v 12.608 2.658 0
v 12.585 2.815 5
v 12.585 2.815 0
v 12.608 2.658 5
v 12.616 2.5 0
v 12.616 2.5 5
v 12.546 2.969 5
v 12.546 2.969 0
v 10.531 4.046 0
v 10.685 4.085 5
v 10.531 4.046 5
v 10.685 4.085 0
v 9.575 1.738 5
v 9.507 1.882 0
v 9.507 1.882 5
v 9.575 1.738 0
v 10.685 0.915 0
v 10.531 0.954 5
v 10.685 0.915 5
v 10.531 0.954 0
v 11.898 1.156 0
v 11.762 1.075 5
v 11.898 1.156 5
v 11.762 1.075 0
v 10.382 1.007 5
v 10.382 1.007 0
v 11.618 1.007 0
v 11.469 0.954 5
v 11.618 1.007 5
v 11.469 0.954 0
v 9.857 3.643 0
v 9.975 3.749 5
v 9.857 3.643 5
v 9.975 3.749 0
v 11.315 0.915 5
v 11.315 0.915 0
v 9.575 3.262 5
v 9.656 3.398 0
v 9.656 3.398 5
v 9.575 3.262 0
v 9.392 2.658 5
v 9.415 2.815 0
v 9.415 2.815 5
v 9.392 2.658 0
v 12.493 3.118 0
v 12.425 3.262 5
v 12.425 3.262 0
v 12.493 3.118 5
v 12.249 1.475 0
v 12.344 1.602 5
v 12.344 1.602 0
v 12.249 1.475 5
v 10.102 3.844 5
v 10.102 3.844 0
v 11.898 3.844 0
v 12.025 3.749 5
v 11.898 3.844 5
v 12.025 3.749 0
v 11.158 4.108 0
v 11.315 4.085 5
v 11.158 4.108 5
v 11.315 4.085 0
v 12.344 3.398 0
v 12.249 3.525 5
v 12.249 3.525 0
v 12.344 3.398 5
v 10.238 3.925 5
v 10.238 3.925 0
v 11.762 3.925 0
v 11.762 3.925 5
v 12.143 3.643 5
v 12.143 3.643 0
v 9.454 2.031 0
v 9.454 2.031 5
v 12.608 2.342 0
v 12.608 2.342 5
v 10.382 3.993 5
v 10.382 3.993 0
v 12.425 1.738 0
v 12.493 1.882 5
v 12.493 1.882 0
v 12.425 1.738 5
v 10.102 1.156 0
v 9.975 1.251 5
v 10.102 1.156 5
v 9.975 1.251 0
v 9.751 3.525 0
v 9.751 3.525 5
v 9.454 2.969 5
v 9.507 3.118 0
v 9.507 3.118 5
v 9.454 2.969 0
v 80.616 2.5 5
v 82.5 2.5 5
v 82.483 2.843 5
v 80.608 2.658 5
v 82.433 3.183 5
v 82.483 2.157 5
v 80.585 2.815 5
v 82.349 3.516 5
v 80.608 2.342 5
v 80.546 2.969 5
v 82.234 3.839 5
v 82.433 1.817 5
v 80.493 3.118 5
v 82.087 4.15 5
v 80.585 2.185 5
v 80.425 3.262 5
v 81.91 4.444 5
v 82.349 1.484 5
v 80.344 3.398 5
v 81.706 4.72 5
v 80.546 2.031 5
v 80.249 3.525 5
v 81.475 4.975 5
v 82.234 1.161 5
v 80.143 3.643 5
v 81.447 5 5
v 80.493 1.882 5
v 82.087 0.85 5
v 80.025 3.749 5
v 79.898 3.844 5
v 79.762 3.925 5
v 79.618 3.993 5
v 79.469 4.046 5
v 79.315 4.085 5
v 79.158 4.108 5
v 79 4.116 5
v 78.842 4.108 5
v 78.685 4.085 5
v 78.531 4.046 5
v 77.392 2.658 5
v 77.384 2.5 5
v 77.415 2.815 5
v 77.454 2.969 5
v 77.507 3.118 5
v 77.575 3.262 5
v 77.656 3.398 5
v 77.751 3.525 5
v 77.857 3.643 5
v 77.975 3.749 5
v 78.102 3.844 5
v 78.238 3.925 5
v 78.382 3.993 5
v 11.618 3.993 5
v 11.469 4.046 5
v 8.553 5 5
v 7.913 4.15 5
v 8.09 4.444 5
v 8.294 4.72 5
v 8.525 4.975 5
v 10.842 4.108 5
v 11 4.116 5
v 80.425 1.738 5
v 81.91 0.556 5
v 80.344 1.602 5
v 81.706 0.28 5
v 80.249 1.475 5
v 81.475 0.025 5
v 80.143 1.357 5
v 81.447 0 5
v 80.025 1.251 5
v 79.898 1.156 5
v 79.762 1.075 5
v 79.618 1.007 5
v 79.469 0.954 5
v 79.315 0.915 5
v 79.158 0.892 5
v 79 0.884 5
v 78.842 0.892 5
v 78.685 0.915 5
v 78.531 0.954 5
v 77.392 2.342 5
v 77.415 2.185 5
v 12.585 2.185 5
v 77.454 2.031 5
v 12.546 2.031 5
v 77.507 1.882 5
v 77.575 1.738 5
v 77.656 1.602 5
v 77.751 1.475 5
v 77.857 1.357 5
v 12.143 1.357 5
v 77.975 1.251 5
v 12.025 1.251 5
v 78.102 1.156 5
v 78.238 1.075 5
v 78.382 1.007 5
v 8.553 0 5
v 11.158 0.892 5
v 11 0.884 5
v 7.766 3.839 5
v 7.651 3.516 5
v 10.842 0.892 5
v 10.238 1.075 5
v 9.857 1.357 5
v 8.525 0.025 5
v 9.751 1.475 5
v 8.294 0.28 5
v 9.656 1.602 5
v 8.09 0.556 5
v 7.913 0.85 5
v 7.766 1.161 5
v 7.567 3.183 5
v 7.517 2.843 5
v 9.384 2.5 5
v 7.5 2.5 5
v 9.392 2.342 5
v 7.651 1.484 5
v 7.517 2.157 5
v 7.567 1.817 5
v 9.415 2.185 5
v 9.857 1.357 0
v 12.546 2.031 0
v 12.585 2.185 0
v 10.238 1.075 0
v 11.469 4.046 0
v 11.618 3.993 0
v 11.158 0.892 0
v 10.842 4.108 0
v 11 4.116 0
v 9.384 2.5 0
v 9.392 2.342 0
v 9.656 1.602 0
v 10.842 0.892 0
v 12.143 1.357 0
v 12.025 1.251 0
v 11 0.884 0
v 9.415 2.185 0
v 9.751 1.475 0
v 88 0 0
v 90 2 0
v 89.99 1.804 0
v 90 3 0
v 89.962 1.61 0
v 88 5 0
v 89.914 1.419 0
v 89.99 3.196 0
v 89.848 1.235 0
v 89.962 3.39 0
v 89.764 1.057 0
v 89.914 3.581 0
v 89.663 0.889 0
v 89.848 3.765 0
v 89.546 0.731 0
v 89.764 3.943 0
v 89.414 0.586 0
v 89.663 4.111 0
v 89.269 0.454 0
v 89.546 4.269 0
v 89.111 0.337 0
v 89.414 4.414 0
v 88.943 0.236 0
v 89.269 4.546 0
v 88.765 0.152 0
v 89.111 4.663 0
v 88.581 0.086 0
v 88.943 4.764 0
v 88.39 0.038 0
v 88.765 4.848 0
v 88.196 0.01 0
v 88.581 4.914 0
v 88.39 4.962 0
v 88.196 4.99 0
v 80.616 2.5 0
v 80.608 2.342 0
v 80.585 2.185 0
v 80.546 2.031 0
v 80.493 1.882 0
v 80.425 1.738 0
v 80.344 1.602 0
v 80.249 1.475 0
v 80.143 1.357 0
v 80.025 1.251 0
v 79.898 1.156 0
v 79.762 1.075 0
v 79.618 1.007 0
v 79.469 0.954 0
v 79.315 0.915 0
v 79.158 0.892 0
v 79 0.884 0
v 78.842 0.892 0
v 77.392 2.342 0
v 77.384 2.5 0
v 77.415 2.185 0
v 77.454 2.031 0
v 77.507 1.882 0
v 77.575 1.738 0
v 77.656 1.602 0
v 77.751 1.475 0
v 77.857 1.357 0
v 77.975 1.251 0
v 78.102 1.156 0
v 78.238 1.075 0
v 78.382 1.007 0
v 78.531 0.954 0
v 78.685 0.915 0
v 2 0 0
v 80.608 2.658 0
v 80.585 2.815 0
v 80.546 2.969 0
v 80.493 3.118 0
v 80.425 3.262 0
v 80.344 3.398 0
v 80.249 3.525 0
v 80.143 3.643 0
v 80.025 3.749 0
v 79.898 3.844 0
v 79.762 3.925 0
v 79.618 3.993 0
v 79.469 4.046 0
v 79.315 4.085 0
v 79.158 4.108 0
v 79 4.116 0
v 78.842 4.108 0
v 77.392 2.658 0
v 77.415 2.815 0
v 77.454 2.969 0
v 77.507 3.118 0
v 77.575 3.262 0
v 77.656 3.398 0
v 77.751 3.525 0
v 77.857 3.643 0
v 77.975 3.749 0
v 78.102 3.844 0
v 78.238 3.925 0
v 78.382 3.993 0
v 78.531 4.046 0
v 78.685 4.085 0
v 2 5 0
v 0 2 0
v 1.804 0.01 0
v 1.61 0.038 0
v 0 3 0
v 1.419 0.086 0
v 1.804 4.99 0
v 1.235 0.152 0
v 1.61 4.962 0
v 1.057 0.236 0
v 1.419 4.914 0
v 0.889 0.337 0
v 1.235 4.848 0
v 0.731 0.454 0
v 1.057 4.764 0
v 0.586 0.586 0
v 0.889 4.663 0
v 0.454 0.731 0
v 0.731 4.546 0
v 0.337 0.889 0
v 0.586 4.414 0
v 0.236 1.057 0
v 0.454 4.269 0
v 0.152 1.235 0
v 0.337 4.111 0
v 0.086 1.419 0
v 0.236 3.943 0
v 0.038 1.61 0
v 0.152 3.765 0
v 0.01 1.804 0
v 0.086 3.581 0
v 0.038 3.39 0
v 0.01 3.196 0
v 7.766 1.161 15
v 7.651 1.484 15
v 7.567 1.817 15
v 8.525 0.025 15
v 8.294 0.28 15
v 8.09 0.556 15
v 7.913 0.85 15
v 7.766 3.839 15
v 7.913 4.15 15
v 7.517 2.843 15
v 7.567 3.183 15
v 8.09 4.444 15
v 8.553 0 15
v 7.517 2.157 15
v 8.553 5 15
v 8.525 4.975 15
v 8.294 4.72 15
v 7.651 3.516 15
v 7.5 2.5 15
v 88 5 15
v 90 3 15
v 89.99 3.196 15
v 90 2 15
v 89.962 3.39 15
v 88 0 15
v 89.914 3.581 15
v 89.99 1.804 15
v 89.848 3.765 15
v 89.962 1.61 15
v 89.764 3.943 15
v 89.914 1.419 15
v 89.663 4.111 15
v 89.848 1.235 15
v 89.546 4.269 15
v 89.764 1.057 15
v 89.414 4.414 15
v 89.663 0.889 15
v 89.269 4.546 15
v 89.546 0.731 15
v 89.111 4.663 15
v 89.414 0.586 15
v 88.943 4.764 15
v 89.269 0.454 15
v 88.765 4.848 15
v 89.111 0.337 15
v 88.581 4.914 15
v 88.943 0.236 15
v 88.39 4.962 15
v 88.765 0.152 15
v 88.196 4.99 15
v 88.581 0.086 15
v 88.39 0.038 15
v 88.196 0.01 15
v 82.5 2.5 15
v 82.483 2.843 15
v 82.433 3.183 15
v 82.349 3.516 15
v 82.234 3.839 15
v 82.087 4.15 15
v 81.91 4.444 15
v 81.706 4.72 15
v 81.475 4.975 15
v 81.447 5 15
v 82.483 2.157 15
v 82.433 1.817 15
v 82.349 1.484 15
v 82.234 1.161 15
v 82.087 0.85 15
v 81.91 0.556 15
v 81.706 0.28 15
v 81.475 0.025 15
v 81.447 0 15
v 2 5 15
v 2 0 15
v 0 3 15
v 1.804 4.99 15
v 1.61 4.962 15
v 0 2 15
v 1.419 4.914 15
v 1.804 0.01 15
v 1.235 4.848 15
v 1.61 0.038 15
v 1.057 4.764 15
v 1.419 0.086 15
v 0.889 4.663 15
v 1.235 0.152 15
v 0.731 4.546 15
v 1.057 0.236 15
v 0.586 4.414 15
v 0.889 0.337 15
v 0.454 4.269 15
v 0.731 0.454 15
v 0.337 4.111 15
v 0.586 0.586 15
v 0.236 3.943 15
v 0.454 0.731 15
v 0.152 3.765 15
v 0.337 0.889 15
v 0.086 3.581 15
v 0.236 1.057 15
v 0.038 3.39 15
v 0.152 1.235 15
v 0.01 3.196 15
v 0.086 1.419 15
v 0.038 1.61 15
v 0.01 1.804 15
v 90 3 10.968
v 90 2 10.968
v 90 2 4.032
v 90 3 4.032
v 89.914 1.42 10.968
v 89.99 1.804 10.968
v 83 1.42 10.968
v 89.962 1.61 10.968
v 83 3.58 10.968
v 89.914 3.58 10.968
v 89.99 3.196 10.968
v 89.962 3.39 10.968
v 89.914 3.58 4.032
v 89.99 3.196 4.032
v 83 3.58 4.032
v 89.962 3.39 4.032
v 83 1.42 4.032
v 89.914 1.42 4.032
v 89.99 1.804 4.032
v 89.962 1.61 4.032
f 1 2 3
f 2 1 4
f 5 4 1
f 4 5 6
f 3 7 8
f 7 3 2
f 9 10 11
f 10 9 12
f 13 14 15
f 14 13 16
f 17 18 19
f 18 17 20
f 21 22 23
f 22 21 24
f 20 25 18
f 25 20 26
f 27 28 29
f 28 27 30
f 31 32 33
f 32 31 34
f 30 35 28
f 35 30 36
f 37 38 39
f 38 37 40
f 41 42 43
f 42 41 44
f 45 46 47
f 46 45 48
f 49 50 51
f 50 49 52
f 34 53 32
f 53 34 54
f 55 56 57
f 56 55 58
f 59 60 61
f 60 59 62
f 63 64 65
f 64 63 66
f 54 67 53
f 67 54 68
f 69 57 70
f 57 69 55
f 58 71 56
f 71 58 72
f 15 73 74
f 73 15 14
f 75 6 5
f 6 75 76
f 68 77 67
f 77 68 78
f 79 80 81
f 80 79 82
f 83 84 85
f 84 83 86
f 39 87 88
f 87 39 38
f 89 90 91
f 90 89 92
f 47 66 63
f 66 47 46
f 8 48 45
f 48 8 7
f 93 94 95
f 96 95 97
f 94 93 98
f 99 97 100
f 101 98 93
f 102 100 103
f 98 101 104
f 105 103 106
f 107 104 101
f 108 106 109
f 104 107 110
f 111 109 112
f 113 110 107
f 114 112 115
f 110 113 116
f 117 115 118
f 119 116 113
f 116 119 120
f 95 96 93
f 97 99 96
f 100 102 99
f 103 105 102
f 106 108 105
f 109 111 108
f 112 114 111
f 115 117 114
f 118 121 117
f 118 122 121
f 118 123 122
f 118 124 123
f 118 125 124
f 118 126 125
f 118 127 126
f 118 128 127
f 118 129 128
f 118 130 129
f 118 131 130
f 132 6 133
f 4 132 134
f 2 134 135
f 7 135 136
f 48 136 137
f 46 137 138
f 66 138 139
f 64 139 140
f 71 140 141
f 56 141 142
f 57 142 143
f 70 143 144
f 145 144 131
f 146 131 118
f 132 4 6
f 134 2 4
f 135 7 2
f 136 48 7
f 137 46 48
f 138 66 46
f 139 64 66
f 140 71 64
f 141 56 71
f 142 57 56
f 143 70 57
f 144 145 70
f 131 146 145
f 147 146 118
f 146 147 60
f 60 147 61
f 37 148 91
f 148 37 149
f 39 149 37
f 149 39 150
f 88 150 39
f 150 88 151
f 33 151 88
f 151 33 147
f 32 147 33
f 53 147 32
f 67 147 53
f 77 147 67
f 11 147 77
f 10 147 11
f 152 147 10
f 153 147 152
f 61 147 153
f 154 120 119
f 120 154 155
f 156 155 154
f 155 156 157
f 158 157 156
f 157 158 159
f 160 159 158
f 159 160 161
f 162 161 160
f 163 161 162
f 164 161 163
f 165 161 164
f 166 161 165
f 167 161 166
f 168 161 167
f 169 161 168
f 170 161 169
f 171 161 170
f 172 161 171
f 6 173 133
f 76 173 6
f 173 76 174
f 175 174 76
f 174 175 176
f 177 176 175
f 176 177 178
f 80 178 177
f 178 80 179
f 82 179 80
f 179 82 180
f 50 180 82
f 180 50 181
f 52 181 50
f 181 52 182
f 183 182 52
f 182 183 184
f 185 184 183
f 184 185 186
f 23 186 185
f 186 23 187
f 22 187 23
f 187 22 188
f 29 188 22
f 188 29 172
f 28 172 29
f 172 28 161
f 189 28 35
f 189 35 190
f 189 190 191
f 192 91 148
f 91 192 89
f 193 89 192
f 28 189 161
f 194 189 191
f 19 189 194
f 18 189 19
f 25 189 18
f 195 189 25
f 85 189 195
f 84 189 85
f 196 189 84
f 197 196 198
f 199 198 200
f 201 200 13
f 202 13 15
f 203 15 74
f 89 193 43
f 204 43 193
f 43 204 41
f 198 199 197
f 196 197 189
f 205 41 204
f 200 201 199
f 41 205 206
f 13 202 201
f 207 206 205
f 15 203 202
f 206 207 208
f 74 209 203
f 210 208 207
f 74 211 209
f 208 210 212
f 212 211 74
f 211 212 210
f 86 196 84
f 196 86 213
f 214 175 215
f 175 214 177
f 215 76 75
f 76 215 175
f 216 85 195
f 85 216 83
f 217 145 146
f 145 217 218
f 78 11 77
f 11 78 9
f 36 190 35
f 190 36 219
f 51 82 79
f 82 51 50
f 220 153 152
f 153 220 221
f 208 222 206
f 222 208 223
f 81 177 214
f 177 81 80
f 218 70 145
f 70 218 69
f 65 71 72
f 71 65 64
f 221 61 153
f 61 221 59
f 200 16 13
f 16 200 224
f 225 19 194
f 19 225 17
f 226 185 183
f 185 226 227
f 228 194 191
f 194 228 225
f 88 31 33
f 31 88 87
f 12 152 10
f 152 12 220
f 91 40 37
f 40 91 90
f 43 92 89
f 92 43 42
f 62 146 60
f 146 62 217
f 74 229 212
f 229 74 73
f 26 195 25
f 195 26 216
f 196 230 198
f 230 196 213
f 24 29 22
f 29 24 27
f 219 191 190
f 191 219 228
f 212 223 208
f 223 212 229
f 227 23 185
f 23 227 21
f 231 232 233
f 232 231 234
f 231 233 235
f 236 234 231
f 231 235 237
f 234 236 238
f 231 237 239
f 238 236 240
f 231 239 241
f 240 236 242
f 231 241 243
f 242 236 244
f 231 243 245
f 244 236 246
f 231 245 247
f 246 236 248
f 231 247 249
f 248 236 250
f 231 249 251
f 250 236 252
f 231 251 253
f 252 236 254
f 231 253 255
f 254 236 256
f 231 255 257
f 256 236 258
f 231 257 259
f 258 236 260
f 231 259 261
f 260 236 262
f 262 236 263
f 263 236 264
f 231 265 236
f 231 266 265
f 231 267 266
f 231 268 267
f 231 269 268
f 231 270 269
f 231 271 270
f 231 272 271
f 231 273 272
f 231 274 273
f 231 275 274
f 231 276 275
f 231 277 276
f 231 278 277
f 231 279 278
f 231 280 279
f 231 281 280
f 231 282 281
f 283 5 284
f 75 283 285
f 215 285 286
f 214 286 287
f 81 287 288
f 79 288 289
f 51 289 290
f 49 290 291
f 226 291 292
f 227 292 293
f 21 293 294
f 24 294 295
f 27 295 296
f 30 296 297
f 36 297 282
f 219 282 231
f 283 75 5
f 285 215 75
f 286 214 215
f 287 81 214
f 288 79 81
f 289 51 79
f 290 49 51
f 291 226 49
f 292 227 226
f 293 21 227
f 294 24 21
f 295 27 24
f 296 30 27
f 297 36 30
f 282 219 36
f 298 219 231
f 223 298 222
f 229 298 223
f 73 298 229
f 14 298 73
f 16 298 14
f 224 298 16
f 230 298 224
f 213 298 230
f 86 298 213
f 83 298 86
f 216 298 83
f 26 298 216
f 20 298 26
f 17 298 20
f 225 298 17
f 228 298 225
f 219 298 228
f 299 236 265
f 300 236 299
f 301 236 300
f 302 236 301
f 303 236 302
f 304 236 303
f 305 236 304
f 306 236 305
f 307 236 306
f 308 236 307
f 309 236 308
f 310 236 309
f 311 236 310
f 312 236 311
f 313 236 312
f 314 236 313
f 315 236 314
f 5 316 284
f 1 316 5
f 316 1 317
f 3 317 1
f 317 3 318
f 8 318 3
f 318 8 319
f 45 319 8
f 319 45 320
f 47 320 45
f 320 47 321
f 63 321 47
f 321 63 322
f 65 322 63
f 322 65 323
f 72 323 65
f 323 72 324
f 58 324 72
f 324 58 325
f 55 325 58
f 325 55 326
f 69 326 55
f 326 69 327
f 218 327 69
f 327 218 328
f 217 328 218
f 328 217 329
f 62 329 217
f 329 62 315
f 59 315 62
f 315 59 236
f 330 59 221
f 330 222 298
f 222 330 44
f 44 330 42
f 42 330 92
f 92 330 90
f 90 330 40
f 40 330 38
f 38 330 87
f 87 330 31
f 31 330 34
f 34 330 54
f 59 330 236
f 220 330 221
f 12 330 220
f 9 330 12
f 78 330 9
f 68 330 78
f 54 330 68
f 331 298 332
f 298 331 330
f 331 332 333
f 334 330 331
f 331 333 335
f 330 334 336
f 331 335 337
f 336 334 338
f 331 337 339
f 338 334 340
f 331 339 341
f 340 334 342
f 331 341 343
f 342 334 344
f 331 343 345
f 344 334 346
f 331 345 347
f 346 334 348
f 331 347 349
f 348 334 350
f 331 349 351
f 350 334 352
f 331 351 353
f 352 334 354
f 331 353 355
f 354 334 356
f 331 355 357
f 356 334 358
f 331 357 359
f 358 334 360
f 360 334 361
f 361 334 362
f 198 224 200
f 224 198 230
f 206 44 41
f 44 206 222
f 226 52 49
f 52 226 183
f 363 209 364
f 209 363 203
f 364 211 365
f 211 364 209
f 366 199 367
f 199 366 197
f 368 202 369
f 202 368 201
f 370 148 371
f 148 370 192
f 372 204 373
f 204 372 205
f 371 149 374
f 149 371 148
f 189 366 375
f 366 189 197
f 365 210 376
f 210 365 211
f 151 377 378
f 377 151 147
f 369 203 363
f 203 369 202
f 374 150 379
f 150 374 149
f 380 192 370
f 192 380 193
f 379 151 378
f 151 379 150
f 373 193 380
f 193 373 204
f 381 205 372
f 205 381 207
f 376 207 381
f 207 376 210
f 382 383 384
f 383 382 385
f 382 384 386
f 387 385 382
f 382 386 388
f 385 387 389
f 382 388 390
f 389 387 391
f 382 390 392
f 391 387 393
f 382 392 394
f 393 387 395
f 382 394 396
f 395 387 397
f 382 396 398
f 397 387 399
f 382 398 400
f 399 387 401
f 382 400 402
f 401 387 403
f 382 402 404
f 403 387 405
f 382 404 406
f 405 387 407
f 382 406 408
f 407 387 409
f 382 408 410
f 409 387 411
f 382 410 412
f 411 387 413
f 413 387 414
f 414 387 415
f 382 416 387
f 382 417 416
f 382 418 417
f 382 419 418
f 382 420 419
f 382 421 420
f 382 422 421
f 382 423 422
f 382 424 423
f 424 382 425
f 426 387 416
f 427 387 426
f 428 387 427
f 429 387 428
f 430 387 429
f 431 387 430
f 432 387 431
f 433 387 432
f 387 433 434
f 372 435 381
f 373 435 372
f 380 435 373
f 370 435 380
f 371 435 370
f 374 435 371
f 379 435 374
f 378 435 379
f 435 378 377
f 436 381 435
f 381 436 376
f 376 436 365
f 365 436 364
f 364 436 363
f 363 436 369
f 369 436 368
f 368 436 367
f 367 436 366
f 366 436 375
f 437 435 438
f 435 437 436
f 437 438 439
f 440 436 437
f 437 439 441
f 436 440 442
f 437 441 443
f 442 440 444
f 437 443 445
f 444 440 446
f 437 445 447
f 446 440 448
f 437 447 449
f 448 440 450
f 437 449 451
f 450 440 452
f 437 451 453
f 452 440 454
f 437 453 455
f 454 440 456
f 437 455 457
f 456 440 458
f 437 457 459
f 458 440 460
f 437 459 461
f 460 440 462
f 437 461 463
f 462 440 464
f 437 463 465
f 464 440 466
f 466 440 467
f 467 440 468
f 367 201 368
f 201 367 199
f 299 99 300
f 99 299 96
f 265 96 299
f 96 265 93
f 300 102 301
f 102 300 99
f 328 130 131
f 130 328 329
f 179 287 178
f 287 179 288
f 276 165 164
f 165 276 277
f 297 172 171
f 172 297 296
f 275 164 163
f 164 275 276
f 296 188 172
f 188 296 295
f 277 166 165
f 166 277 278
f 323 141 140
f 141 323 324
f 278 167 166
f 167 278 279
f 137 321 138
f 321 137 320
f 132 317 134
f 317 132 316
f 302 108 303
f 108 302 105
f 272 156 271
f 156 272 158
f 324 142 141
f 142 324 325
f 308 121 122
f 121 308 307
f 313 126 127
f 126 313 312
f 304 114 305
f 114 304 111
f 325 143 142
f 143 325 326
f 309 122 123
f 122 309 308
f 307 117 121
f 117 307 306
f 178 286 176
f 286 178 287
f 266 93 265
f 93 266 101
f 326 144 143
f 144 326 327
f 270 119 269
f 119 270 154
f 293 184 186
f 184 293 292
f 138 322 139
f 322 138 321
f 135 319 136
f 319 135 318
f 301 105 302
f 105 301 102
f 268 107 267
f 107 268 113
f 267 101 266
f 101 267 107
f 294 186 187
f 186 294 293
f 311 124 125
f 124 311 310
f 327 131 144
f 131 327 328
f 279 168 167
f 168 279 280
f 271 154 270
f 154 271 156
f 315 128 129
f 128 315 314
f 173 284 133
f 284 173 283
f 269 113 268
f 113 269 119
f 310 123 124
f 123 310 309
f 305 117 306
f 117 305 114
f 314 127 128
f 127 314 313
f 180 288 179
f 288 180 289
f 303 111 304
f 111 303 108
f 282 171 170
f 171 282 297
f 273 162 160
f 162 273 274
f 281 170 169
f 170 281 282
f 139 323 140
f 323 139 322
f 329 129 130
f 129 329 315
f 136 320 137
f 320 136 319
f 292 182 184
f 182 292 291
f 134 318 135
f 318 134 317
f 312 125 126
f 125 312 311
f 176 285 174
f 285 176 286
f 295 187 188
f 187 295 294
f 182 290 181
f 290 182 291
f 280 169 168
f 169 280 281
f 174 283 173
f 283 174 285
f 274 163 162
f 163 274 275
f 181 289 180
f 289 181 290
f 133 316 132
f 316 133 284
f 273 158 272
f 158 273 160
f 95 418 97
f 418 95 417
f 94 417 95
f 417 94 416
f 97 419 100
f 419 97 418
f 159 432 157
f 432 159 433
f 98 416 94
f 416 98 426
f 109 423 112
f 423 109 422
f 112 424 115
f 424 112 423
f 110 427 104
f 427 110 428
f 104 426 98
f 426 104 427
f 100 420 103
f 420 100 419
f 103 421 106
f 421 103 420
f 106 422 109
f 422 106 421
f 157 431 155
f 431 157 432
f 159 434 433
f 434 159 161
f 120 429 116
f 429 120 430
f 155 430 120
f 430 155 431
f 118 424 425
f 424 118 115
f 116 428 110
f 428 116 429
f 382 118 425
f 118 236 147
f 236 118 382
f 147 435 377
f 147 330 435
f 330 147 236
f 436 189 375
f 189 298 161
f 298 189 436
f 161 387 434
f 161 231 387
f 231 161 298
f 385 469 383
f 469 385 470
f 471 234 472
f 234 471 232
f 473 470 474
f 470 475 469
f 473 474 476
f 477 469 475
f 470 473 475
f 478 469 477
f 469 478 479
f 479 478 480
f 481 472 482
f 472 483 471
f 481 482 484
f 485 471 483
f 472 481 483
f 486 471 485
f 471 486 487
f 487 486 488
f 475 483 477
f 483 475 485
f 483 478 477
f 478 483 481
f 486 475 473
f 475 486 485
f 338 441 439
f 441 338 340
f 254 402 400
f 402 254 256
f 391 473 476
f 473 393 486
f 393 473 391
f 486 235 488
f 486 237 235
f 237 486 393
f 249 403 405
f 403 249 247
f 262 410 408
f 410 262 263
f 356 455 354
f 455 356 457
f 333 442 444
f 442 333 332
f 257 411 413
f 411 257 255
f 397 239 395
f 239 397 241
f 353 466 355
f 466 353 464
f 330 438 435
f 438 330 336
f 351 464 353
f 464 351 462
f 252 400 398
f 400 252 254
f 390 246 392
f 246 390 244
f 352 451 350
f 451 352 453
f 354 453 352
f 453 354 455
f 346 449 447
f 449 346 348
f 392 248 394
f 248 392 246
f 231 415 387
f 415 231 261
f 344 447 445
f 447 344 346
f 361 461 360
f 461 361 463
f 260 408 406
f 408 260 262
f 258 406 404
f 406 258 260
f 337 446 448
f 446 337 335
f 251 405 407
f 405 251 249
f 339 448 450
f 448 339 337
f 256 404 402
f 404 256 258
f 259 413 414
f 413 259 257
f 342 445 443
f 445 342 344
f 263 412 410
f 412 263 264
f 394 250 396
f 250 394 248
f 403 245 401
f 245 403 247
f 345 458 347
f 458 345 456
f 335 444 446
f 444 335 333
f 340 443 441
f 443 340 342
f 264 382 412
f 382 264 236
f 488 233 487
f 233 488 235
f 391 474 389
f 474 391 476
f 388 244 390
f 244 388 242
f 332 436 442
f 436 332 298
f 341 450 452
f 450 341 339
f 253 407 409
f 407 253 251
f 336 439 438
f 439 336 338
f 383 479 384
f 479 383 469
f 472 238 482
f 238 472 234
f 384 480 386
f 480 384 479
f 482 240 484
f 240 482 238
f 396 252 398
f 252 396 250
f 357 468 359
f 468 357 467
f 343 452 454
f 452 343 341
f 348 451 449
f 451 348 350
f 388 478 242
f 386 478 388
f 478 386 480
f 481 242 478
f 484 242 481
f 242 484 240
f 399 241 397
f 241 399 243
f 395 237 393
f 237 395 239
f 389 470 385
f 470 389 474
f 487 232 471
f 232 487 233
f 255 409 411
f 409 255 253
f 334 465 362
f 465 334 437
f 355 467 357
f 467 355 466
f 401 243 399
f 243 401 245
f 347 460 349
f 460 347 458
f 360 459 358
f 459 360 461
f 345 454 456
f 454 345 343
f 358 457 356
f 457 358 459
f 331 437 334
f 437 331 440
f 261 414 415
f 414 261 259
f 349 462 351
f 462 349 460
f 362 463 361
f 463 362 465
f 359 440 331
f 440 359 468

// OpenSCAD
$fn=64;

difference() {
  minkowski() {
    translate([2, 2, 0]) cube([90-2*2, 5-2*2, 14]);
    cylinder(h=1, r=2);
  }
//  cube([90, 5, 15]);
  union() {
    translate([11, 2.5, 0]) cylinder(h=5, d=3.2*1.01);
    translate([11, 2.5, 5]) cylinder(h=10, d=7);
    translate([90-5-12+6, 2.5, 0]) cylinder(h=5, d=3.2*1.01);
    translate([90-5-12+6, 2.5, 5]) cylinder(h=10, d=7);
    translate([11, 0, 5]) cube([68, 5, 10]);
    
    // Lightning slot.
//    translate([90-7, 5/2-1.8/2, 15/2-6.8/2]) cube([7, 1.8, 6.8]);

    // USB-C slot.
//    translate([90-7.2, 5/2-2.4*1.2/2, 15/2-8.2*1.02/2])
//    cube([7.2, 2.4*1.2, 8.2*1.02]);

    // Micro USB slot.
    translate([90-7, 5/2-1.8*1.2/2, 15/2-6.8*1.02/2])
    cube([7, 1.8*1.2, 6.8*1.02]);
  }
}
